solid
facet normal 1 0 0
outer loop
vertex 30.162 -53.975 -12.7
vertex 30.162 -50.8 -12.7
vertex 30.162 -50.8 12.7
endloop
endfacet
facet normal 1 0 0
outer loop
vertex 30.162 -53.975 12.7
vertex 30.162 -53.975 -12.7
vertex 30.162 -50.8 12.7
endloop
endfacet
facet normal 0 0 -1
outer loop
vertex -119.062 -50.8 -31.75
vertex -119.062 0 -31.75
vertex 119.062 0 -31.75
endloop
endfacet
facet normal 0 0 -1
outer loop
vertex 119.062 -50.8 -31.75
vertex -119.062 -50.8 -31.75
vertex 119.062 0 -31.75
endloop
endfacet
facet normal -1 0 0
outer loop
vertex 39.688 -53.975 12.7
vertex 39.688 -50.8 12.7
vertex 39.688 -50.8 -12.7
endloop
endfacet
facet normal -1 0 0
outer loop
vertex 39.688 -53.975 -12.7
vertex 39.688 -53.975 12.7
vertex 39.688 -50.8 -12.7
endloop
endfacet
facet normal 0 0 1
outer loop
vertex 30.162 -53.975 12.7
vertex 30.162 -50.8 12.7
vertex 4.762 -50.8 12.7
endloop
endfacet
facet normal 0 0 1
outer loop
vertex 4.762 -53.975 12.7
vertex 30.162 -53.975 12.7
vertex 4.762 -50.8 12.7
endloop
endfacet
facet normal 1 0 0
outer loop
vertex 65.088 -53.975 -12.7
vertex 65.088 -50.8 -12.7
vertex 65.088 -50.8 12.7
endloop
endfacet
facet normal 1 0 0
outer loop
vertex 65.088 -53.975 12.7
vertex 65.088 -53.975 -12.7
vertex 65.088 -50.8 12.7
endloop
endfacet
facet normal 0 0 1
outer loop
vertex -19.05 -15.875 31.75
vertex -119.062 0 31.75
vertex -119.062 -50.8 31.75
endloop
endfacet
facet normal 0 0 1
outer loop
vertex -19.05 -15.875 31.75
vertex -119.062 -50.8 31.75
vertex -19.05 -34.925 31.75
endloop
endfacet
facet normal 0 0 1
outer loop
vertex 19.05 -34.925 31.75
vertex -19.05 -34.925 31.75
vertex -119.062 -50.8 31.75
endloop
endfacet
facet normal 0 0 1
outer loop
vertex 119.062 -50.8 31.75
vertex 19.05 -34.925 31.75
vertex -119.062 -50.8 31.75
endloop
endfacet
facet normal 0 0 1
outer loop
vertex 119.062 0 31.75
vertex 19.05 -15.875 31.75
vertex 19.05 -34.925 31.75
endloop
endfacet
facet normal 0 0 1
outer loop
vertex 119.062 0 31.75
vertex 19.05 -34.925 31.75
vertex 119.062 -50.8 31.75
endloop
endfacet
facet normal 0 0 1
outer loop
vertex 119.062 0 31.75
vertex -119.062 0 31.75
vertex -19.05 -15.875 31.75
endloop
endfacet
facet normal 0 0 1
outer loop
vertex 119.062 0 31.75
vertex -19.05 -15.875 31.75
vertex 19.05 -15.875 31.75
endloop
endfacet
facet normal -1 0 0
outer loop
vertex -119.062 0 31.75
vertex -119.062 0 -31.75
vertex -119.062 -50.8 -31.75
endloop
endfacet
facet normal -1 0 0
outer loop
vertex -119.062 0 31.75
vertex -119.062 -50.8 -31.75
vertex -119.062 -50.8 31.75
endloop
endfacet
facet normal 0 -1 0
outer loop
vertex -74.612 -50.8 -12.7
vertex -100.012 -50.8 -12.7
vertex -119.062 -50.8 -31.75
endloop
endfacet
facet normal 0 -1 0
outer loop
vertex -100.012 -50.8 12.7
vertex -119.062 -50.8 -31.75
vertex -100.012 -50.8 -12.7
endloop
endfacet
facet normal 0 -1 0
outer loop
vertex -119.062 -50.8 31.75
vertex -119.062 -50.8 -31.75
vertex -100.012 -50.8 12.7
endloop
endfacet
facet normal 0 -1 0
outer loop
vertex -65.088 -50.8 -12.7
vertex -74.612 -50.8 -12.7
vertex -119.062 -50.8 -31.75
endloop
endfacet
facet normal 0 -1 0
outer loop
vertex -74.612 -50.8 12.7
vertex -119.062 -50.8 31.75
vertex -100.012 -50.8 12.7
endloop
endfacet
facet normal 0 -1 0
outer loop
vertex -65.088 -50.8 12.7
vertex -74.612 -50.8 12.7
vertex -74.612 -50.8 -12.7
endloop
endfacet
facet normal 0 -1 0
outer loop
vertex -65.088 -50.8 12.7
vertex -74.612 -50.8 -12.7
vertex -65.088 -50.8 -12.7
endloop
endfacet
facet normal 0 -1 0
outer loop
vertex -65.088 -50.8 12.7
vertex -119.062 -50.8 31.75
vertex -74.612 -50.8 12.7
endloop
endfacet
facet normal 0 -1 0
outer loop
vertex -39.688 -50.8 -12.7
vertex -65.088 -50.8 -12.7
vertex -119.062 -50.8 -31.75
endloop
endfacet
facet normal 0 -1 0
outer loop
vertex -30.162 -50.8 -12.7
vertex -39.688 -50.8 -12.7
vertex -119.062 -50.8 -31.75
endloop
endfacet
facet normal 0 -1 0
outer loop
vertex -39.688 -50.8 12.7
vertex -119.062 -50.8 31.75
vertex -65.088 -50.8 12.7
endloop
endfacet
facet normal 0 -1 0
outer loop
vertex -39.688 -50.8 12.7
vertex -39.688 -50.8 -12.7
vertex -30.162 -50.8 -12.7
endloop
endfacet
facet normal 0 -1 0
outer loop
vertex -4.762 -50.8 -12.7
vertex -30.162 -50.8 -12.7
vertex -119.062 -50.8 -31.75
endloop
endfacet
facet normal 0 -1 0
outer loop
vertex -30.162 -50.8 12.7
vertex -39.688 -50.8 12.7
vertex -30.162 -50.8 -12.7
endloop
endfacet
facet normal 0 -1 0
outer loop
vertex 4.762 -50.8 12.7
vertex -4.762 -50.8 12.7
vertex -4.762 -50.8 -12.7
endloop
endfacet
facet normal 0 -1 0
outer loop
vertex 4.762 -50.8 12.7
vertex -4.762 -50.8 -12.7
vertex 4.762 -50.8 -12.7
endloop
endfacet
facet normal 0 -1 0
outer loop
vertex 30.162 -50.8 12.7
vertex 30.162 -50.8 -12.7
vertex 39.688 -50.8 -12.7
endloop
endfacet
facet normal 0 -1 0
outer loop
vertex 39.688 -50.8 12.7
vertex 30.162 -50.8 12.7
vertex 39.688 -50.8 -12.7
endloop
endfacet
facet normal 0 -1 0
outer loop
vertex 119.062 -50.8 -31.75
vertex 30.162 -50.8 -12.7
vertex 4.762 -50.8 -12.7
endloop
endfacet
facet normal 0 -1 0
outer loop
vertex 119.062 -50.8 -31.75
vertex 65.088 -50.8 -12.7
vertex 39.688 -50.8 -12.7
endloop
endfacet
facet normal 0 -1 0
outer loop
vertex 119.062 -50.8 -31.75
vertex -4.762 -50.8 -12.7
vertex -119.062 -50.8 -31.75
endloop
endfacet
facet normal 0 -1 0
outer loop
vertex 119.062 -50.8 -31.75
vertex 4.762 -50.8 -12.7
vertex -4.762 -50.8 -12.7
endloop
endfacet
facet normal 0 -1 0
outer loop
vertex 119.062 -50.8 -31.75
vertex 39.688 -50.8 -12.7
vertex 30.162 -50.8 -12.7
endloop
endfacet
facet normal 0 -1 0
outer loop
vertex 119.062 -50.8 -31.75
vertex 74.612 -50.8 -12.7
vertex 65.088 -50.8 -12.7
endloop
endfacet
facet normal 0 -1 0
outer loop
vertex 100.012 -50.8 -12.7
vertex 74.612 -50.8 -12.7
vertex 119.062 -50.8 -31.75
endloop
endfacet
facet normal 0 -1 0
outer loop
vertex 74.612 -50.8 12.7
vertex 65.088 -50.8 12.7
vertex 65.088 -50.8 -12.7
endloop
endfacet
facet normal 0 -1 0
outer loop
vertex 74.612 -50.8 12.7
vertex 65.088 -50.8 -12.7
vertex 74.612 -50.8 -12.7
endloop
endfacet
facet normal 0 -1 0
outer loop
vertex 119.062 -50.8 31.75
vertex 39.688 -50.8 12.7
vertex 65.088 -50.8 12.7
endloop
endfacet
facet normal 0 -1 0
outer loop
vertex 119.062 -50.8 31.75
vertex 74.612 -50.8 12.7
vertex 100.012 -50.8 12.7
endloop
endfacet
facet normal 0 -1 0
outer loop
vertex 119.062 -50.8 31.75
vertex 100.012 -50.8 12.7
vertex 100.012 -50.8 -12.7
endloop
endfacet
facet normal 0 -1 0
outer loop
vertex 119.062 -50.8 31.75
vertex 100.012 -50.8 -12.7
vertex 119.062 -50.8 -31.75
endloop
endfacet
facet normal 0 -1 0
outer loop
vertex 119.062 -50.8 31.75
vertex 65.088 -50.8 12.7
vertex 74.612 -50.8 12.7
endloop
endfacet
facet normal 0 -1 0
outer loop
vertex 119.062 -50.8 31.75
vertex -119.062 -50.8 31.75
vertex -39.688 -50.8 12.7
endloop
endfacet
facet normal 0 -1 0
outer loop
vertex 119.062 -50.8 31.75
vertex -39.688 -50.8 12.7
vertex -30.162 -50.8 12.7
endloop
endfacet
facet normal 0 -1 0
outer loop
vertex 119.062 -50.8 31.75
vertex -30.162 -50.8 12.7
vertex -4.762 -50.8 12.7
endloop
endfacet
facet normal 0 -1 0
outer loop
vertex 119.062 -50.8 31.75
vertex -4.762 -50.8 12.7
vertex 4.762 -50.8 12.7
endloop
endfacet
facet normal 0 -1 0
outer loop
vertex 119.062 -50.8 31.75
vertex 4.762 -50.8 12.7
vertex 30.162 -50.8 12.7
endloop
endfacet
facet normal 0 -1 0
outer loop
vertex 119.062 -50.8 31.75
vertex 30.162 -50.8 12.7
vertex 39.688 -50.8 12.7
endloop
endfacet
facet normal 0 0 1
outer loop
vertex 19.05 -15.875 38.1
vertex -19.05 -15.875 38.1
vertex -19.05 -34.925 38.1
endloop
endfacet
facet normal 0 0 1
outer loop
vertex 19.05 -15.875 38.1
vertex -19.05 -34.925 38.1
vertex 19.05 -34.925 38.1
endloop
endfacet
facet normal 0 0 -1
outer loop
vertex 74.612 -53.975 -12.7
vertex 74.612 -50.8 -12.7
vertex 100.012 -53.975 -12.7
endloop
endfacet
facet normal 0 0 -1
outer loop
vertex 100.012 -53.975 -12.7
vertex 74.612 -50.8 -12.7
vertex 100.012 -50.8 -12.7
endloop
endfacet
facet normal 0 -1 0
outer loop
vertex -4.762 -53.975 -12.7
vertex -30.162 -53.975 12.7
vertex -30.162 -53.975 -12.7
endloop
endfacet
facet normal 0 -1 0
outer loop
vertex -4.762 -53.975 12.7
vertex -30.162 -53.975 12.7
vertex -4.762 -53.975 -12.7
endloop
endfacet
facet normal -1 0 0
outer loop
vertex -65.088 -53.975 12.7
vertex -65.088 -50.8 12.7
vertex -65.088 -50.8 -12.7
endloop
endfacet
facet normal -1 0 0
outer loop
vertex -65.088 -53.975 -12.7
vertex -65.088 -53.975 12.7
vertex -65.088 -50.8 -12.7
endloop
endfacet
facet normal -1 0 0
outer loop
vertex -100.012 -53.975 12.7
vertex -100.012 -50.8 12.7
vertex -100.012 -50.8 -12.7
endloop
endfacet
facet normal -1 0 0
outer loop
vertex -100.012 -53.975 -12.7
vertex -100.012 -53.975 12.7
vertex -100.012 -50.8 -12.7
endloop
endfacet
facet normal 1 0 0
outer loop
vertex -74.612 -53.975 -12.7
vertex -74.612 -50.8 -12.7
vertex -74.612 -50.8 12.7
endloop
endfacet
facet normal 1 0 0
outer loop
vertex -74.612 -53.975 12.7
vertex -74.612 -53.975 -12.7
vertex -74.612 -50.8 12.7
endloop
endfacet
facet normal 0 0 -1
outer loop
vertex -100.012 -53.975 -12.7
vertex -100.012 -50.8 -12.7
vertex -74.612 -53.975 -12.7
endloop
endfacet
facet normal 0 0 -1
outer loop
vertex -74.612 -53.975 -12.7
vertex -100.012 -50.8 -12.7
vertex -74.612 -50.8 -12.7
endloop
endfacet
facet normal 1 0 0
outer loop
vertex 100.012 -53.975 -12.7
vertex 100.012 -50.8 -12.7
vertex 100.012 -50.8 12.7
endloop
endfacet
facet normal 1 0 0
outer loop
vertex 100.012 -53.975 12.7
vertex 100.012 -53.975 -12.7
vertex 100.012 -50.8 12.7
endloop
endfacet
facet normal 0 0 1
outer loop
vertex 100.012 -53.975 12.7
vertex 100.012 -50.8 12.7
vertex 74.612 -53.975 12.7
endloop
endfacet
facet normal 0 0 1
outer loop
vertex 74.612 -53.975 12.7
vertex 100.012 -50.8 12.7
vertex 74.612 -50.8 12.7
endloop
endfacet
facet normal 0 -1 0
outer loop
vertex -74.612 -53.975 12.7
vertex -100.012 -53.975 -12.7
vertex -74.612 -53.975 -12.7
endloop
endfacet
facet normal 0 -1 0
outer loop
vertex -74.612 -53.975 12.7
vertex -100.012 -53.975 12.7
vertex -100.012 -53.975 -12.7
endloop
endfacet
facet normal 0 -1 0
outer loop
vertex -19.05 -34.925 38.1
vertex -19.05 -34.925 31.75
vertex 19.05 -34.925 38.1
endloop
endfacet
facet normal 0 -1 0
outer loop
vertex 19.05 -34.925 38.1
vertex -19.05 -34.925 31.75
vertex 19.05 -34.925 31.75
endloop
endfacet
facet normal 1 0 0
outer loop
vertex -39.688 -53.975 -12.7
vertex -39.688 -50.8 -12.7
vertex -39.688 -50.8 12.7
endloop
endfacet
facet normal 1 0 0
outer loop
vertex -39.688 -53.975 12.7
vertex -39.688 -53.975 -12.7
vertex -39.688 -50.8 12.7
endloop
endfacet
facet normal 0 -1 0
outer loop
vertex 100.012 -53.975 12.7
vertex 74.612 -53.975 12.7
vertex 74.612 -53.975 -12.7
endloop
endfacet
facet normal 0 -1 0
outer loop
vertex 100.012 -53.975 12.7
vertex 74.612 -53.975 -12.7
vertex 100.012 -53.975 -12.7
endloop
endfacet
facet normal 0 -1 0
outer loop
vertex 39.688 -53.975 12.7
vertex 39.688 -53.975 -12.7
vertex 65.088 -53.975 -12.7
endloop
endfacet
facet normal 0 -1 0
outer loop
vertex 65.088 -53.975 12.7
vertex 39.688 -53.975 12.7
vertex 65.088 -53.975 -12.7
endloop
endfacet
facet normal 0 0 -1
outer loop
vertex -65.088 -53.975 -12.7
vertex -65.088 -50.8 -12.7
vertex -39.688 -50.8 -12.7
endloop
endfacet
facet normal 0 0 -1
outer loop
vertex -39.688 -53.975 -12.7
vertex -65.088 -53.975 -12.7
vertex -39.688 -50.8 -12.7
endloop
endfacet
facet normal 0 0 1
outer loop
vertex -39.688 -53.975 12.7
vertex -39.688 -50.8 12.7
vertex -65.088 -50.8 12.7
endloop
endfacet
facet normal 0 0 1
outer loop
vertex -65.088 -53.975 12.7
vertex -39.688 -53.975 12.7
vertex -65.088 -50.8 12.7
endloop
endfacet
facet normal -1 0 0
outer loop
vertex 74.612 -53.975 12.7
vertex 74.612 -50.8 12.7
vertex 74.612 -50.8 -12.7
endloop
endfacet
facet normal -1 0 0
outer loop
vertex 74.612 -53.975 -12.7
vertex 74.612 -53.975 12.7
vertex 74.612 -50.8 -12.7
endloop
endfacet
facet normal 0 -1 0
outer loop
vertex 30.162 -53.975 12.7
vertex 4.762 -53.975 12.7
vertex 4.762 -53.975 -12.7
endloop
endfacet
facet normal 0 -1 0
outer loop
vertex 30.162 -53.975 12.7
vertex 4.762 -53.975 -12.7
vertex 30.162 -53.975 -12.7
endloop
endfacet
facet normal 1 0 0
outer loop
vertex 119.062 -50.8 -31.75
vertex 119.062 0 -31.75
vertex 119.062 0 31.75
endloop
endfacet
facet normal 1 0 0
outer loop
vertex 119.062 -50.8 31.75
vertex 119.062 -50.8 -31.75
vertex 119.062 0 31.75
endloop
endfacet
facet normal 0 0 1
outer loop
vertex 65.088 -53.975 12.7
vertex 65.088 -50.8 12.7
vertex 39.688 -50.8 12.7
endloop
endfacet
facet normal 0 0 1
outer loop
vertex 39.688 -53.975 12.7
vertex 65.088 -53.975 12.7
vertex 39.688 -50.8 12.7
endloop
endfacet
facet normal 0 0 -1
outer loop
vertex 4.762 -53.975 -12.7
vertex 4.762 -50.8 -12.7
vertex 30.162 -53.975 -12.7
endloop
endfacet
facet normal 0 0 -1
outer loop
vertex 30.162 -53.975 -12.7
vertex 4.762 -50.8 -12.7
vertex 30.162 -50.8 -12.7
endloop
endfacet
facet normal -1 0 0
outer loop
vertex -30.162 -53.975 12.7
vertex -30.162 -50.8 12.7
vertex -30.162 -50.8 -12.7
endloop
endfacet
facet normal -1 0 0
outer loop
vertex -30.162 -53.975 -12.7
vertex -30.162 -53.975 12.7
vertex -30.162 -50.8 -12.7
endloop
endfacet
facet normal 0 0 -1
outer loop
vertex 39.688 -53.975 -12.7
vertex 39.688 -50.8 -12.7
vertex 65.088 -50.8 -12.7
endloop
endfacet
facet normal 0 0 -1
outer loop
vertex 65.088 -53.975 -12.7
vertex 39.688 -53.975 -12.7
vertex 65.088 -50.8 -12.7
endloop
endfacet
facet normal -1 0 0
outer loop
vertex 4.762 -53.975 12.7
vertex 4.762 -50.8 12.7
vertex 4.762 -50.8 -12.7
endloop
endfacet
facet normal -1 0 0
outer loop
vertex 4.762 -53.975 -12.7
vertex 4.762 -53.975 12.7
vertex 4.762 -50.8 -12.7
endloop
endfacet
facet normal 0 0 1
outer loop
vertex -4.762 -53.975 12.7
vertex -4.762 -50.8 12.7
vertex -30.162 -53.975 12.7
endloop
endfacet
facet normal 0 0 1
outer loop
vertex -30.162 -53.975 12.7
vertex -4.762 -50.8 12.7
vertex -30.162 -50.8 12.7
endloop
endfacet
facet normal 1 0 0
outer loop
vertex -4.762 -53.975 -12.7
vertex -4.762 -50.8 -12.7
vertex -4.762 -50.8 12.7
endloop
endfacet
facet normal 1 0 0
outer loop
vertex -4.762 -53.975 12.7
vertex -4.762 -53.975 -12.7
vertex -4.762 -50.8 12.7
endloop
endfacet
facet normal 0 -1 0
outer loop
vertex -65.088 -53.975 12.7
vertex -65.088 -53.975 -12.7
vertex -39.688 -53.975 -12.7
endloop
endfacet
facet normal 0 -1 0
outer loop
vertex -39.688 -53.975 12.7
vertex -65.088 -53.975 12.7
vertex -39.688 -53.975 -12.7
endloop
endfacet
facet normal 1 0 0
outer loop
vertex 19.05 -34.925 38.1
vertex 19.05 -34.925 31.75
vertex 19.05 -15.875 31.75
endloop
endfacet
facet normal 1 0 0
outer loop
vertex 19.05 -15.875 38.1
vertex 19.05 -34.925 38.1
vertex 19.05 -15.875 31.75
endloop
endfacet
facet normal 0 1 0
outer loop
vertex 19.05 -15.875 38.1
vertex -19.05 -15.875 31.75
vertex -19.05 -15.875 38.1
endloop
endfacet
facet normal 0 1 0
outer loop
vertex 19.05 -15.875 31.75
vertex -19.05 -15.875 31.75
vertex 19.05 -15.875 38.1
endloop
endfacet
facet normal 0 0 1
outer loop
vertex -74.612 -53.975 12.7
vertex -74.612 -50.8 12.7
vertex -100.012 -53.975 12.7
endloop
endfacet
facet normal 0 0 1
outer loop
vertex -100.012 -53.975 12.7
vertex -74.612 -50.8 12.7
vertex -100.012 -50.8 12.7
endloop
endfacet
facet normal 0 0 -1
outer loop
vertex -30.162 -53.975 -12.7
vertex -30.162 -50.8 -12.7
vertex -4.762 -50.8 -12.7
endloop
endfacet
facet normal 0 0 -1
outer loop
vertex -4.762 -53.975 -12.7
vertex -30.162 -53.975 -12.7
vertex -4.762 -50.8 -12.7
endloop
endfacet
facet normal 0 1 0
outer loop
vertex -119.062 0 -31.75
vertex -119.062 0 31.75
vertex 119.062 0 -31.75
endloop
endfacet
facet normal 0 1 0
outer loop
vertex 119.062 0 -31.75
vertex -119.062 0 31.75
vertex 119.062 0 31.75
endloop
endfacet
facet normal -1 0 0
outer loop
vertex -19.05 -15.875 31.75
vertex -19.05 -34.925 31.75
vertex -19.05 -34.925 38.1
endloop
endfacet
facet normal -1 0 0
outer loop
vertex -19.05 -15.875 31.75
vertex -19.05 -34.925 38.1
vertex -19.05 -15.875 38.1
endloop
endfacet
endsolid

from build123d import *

# Parameters (mm, degrees)
F0_W     = 238.125
F0_H     = 63.5
F1_DEPTH = 50.8
F3_DEPTH = 3.175
F4_W     = 38.1
F4_H     = 19.05
F5_DEPTH = 6.35


with BuildPart() as f1:
    # F0 (on Front) → F1 (new body)
    with BuildSketch(Plane.XZ):
        Rectangle(F0_W, F0_H)
    extrude(amount=F1_DEPTH)

    # F2 (on face) → F3 (join)
    with BuildSketch(Plane.XZ.offset(50.8)):
        Polygon((-87.3125, 0), (-100.0125, 0), (-100.0125, -12.7), (-74.6125, -12.7), (-74.6125, 0), align=None)
        Polygon((-100.0125, 12.7), (-100.0125, 0), (-87.3125, 0), (-74.6125, 0), (-74.6125, 12.7), align=None)
        Polygon((-65.0875, 12.7), (-65.0875, 0), (-52.3875, 0), (-39.6875, 0), (-39.6875, 12.7), align=None)
        Polygon((-52.3875, 0), (-65.0875, 0), (-65.0875, -12.7), (-39.6875, -12.7), (-39.6875, 0), align=None)
        Polygon((-30.1625, 12.7), (-30.1625, 0), (-17.4625, 0), (-4.7625, 0), (-4.7625, 12.7), align=None)
        Polygon((-17.4625, 0), (-30.1625, 0), (-30.1625, -12.7), (-4.7625, -12.7), (-4.7625, 0), align=None)
        Polygon((4.7625, 12.7), (4.7625, 0), (17.4625, 0), (30.1625, 0), (30.1625, 12.7), align=None)
        Polygon((17.4625, 0), (4.7625, 0), (4.7625, -12.7), (30.1625, -12.7), (30.1625, 0), align=None)
        Polygon((39.6875, 12.7), (39.6875, 0), (52.3875, 0), (65.0875, 0), (65.0875, 12.7), align=None)
        Polygon((52.3875, 0), (39.6875, 0), (39.6875, -12.7), (65.0875, -12.7), (65.0875, 0), align=None)
        Polygon((74.6125, 12.7), (74.6125, 0), (87.3125, 0), (100.0125, 0), (100.0125, 12.7), align=None)
        Polygon((87.3125, 0), (74.6125, 0), (74.6125, -12.7), (100.0125, -12.7), (100.0125, 0), align=None)
    extrude(amount=F3_DEPTH)

    # F4 (on face) → F5 (join)
    with BuildSketch(Plane.XY.offset(31.75)):
        with Locations((0, -25.4)):
            Rectangle(F4_W, F4_H)
    extrude(amount=F5_DEPTH)


solid = f1.part
